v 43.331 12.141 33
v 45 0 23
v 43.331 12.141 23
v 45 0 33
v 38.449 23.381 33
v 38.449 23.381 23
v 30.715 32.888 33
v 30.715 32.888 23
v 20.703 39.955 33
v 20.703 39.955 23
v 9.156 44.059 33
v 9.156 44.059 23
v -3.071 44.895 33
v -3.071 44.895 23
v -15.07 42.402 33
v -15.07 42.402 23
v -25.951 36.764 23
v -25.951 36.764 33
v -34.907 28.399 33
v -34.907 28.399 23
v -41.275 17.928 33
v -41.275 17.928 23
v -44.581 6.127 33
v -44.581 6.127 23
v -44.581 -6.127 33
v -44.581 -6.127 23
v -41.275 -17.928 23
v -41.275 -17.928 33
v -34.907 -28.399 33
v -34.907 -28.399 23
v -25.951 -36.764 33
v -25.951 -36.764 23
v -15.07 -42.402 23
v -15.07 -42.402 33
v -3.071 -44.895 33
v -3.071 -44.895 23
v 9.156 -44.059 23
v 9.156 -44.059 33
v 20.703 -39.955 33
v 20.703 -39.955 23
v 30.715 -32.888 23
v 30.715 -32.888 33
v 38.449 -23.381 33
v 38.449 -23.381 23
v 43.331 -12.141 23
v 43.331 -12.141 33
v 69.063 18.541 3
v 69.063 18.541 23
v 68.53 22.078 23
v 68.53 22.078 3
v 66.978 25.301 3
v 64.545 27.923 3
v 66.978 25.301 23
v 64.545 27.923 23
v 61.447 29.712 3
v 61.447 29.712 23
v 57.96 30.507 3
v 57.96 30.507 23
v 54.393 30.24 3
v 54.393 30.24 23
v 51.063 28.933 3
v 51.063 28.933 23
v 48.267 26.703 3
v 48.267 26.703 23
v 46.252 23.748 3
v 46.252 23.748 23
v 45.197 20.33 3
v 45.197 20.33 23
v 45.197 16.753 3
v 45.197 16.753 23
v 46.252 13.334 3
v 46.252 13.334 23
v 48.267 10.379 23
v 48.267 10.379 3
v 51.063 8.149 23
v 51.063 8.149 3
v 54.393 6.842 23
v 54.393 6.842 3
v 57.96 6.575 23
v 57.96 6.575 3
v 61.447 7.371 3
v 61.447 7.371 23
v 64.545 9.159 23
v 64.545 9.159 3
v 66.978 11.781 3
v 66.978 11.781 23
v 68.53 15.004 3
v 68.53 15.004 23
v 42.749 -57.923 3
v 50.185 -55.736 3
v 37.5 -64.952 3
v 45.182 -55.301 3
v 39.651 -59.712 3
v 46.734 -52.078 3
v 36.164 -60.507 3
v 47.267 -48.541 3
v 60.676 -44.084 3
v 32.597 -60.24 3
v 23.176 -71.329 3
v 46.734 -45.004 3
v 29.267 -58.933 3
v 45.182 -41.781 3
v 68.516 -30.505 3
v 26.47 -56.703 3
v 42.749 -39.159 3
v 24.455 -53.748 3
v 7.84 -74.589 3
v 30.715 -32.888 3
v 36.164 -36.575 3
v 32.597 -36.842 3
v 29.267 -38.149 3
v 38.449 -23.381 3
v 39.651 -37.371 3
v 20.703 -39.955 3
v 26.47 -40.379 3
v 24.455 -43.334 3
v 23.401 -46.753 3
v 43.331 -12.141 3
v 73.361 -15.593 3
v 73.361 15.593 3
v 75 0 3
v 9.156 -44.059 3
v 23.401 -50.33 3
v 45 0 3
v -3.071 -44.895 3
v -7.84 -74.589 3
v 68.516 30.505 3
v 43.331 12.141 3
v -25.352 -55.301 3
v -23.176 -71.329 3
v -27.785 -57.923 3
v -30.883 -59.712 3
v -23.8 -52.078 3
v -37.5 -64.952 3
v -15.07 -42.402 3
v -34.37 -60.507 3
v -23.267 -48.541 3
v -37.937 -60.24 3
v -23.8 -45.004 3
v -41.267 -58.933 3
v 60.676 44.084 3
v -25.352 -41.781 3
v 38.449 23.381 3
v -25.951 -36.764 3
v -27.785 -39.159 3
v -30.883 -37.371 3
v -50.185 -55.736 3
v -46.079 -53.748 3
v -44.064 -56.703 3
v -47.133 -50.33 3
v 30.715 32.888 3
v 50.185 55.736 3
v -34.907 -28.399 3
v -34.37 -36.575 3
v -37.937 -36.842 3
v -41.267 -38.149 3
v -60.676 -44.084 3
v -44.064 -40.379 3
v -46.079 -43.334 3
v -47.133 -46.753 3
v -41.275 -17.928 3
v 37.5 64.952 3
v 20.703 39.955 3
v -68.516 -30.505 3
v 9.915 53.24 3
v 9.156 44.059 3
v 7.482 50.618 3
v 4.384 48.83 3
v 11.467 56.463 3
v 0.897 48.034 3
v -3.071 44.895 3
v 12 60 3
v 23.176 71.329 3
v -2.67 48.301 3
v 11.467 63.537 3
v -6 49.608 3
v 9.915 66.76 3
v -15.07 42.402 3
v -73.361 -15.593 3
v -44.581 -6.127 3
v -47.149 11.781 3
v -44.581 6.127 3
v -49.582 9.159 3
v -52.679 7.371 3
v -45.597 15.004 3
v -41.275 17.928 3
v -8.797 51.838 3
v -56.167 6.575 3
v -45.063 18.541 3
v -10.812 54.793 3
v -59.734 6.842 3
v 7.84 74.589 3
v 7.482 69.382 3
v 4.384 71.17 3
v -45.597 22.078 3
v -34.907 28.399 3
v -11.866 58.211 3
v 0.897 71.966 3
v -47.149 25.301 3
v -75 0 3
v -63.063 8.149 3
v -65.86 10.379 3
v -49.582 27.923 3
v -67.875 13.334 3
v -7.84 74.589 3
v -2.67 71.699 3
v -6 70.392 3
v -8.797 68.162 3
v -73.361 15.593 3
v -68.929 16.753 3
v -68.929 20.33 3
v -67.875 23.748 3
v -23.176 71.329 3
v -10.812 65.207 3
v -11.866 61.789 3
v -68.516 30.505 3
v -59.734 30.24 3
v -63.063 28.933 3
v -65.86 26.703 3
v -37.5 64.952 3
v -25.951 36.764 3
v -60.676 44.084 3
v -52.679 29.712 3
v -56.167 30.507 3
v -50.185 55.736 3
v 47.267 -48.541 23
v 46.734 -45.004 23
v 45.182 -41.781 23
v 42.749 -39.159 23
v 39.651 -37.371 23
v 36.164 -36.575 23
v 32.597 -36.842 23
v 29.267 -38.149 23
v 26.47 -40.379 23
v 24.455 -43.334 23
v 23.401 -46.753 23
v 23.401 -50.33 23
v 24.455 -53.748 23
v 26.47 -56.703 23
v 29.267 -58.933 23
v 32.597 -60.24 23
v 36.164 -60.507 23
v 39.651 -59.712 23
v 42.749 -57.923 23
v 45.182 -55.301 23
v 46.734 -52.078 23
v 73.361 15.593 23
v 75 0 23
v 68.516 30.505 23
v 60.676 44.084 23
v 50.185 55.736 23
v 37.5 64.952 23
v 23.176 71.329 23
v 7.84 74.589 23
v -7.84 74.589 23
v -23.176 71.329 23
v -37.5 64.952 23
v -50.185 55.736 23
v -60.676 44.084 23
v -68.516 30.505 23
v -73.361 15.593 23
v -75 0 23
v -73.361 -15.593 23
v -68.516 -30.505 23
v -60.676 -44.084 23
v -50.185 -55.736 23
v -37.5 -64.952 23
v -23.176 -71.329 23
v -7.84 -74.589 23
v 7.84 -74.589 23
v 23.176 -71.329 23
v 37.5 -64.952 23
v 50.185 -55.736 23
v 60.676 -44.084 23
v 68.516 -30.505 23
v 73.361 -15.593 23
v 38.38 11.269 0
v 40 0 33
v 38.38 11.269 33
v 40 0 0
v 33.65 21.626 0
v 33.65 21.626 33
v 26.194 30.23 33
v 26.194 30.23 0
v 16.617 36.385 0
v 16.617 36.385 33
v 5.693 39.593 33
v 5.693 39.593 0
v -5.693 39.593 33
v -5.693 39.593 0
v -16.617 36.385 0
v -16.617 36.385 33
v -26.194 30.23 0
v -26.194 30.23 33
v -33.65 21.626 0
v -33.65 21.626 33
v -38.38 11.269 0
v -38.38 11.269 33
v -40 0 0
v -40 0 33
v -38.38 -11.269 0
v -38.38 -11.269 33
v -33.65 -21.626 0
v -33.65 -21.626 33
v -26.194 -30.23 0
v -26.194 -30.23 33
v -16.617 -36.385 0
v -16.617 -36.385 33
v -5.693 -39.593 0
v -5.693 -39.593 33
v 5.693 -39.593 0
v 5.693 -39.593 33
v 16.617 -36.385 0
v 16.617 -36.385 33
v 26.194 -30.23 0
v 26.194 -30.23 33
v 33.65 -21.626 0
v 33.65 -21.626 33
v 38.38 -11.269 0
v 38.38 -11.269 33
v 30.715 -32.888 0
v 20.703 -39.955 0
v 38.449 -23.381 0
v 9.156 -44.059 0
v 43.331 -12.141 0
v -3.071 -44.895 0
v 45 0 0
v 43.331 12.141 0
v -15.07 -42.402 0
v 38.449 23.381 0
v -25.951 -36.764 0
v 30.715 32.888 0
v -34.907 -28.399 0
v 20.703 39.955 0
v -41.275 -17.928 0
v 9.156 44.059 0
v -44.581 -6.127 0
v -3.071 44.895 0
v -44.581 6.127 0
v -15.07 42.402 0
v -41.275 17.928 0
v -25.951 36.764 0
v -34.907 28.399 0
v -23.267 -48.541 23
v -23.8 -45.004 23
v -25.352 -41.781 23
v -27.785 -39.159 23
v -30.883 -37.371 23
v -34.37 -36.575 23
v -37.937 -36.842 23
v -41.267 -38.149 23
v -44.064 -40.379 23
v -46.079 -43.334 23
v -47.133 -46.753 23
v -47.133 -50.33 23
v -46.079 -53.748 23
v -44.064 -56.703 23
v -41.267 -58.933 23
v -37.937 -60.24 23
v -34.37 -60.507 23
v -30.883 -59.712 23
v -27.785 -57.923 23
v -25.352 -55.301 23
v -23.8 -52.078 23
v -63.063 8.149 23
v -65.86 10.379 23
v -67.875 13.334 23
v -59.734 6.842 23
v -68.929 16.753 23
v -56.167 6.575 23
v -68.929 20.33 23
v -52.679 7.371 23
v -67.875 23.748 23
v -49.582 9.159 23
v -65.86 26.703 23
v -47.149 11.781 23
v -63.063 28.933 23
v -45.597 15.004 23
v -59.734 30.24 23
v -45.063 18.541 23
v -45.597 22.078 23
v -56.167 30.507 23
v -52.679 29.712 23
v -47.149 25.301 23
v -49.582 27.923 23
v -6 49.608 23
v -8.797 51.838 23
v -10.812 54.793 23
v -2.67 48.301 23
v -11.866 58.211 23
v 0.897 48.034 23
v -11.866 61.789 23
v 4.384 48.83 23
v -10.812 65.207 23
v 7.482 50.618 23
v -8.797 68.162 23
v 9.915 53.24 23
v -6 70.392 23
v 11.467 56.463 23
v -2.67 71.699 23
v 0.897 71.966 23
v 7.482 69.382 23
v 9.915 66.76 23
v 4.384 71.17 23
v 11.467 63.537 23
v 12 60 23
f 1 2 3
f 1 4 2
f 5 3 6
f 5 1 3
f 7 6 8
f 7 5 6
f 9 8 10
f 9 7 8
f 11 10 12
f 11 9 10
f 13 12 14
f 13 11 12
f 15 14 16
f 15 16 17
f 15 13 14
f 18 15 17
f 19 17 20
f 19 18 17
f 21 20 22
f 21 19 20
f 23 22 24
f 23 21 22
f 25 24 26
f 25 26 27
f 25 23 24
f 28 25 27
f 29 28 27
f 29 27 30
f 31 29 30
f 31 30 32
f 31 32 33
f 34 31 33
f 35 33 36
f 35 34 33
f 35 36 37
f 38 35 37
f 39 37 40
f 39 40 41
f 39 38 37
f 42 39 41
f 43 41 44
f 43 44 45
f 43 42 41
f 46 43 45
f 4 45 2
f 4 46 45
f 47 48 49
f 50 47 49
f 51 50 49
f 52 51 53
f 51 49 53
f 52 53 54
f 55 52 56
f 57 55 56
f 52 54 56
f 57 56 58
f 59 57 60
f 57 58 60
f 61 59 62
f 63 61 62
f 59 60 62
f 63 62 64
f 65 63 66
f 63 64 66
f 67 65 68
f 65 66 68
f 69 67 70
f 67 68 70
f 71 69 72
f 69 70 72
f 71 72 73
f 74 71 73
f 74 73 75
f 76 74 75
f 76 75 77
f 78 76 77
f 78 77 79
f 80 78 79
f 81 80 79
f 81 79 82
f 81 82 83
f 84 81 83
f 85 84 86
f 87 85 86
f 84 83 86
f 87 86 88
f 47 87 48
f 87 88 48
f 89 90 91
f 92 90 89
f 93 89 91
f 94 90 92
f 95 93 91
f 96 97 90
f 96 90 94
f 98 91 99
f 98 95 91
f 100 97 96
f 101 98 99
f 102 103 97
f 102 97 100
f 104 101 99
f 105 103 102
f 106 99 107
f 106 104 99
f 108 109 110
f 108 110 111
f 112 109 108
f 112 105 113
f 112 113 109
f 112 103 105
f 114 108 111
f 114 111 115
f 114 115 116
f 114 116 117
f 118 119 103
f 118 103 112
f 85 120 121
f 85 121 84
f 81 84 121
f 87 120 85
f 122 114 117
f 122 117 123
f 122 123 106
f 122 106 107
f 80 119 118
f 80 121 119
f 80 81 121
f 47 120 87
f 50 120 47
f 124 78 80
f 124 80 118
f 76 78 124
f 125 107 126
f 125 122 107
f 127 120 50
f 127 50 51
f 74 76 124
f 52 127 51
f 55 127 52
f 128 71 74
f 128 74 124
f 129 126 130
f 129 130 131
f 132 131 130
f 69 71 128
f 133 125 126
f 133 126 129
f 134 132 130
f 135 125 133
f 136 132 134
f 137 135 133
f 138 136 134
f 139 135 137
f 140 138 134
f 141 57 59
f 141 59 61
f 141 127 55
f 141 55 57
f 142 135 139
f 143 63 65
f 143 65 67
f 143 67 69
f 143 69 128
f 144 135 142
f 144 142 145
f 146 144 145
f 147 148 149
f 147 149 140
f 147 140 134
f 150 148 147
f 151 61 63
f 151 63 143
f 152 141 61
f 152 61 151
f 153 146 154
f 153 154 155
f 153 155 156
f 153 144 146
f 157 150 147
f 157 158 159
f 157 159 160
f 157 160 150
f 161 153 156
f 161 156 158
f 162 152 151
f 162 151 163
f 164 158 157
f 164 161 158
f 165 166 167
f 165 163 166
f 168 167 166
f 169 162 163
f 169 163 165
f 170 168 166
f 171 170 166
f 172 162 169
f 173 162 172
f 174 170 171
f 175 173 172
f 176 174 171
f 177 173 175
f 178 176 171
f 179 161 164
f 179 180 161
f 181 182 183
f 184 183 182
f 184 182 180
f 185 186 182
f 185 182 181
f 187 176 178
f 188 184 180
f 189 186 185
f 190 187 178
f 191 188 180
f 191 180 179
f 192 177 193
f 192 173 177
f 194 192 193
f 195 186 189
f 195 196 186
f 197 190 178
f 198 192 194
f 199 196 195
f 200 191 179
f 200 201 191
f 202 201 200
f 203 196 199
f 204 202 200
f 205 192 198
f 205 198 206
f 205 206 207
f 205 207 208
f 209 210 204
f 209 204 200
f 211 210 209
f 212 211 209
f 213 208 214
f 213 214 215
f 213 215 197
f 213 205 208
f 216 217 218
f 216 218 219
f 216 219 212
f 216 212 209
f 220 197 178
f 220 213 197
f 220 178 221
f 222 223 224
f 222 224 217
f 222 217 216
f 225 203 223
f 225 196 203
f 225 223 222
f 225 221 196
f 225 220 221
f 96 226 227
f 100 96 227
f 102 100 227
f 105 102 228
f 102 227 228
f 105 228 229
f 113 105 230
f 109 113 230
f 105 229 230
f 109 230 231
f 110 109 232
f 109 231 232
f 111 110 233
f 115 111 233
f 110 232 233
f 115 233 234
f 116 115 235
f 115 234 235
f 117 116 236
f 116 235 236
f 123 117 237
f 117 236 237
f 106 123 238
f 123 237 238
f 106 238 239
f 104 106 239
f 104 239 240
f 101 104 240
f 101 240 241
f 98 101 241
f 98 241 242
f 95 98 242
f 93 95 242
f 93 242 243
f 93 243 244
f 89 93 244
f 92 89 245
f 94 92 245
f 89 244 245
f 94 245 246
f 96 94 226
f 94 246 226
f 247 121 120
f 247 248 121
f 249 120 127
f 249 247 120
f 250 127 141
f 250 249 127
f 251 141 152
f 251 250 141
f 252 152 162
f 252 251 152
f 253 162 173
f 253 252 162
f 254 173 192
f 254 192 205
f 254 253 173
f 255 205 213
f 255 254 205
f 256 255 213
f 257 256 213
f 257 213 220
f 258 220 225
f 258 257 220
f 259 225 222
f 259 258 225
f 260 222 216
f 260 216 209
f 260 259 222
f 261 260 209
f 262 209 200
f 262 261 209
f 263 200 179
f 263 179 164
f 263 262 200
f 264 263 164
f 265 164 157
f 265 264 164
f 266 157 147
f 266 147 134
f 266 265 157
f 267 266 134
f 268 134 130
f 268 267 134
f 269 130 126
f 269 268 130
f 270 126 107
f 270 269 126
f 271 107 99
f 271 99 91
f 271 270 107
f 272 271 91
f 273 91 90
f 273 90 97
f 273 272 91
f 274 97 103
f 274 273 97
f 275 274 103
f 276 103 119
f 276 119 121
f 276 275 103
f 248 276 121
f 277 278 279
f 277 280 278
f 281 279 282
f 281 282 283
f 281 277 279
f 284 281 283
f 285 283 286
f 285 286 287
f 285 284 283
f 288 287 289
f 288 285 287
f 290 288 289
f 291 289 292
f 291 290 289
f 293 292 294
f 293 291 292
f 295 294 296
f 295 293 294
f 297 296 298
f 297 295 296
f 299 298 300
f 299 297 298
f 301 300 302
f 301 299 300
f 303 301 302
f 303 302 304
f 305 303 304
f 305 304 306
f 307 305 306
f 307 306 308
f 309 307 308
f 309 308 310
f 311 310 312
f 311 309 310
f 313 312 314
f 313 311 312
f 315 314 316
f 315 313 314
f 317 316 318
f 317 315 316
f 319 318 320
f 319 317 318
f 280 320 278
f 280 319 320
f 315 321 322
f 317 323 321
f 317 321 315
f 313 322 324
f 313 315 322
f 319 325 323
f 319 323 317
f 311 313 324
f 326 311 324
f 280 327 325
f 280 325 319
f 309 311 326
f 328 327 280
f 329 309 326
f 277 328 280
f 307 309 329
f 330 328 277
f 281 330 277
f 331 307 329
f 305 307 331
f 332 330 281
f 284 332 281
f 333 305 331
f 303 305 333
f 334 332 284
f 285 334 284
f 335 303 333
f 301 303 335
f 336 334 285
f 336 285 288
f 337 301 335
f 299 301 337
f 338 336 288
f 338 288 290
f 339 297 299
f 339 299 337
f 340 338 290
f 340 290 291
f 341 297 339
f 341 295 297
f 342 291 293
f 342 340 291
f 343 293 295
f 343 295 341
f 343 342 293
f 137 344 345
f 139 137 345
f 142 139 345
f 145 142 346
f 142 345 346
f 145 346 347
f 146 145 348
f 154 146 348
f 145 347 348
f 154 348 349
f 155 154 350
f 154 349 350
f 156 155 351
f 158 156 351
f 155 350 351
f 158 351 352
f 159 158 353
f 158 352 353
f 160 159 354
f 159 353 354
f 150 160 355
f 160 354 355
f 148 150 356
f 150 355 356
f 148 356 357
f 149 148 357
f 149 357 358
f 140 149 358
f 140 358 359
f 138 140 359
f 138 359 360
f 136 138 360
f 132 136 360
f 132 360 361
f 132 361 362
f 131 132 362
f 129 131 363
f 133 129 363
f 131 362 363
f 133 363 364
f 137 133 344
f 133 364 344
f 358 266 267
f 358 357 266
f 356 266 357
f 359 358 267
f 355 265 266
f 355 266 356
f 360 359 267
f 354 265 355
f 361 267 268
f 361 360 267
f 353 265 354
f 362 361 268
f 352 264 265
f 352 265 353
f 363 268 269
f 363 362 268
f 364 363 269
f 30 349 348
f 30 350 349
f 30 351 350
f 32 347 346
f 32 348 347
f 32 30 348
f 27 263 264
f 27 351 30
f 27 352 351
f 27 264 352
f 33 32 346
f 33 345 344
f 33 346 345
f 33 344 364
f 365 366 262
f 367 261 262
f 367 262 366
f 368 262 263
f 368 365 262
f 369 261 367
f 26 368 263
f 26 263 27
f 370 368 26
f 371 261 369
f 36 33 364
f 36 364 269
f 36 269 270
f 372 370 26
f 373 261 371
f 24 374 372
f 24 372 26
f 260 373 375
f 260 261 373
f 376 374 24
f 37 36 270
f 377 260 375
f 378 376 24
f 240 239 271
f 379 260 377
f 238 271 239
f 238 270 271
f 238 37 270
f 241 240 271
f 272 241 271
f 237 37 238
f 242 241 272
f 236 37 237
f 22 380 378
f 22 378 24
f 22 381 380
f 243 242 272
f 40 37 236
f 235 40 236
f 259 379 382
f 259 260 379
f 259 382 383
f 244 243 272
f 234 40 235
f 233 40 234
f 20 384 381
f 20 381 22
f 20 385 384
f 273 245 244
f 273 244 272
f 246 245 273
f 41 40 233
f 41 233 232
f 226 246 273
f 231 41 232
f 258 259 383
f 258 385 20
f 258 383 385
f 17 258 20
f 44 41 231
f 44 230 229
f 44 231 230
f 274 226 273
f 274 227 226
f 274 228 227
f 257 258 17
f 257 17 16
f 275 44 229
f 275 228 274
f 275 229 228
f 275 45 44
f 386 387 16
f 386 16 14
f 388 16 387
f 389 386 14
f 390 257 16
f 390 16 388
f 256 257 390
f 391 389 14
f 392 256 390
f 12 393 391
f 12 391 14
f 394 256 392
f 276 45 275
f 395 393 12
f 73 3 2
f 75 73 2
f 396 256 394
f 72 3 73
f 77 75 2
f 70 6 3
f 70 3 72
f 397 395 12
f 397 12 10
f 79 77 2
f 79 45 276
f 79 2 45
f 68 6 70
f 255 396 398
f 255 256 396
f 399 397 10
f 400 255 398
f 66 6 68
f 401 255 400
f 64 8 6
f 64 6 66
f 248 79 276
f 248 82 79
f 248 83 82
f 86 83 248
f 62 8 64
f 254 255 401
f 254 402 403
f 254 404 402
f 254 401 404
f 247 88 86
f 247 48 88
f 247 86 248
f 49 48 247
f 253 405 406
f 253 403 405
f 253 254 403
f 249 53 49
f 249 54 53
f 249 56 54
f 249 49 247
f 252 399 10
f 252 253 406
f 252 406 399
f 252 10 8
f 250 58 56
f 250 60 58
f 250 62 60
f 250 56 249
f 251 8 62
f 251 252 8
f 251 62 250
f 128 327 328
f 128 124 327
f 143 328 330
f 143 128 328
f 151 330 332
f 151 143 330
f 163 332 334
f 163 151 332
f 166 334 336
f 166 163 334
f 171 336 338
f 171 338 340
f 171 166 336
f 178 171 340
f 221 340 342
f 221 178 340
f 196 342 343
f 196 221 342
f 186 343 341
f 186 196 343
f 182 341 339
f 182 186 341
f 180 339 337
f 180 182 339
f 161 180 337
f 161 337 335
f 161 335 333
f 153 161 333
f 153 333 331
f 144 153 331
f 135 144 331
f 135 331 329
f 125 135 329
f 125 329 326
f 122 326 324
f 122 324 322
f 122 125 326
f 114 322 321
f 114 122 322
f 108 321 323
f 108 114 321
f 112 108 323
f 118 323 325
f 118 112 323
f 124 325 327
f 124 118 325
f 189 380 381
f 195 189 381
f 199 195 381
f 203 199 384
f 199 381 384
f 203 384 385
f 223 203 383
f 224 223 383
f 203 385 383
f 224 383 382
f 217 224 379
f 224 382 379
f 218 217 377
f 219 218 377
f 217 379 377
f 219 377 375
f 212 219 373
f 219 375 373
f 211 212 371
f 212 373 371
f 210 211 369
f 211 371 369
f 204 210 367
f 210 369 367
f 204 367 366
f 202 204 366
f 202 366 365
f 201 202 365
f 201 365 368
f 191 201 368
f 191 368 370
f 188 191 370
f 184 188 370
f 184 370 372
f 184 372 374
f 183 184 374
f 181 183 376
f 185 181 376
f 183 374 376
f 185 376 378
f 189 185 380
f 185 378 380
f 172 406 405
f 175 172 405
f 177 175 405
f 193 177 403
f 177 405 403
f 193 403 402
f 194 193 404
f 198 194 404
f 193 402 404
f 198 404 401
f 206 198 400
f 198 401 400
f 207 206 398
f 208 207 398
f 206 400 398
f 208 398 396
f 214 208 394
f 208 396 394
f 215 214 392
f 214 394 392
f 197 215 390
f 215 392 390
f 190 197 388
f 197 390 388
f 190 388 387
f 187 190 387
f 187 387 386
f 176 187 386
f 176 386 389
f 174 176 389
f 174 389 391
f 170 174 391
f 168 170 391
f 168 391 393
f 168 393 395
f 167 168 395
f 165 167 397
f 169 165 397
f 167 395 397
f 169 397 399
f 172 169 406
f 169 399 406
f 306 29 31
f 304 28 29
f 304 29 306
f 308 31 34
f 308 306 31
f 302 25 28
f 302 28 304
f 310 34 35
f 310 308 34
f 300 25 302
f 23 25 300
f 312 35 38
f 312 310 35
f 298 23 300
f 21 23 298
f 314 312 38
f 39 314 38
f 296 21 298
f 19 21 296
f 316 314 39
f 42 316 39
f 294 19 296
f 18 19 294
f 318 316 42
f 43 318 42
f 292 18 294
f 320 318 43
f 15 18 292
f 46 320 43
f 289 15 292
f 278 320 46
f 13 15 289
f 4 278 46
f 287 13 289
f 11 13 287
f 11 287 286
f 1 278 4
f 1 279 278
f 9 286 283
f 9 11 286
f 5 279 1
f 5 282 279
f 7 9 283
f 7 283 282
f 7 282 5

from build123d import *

# Parameters (mm, degrees)
F2_R     = 12
F3_DEPTH = 20


with BuildPart() as f1:
    # F0 (on Front) → F1 (revolve)
    with BuildSketch(Plane.XZ):
        Polygon((40, 33), (40, 0), (45, 0), (45, 3), (75, 3), (75, 23), (45, 23), (45, 33), align=None)
    revolve(axis=Axis((0, 0, 39.782755), (0, 0, 1)))

    # F2 (on face) → F3 (cut, through all)
    with BuildSketch(Plane.XY.offset(23)):
        with Locations((0, 60)):
            Circle(F2_R)
        with Locations((-57.063391, 18.54102)):
            Circle(F2_R)
        with Locations((-35.267115, -48.54102)):
            Circle(F2_R)
        with Locations((35.267115, -48.54102)):
            Circle(F2_R)
        with Locations((57.063391, 18.54102)):
            Circle(F2_R)
    extrude(amount=-F3_DEPTH, mode=Mode.SUBTRACT)


solid = f1.part
